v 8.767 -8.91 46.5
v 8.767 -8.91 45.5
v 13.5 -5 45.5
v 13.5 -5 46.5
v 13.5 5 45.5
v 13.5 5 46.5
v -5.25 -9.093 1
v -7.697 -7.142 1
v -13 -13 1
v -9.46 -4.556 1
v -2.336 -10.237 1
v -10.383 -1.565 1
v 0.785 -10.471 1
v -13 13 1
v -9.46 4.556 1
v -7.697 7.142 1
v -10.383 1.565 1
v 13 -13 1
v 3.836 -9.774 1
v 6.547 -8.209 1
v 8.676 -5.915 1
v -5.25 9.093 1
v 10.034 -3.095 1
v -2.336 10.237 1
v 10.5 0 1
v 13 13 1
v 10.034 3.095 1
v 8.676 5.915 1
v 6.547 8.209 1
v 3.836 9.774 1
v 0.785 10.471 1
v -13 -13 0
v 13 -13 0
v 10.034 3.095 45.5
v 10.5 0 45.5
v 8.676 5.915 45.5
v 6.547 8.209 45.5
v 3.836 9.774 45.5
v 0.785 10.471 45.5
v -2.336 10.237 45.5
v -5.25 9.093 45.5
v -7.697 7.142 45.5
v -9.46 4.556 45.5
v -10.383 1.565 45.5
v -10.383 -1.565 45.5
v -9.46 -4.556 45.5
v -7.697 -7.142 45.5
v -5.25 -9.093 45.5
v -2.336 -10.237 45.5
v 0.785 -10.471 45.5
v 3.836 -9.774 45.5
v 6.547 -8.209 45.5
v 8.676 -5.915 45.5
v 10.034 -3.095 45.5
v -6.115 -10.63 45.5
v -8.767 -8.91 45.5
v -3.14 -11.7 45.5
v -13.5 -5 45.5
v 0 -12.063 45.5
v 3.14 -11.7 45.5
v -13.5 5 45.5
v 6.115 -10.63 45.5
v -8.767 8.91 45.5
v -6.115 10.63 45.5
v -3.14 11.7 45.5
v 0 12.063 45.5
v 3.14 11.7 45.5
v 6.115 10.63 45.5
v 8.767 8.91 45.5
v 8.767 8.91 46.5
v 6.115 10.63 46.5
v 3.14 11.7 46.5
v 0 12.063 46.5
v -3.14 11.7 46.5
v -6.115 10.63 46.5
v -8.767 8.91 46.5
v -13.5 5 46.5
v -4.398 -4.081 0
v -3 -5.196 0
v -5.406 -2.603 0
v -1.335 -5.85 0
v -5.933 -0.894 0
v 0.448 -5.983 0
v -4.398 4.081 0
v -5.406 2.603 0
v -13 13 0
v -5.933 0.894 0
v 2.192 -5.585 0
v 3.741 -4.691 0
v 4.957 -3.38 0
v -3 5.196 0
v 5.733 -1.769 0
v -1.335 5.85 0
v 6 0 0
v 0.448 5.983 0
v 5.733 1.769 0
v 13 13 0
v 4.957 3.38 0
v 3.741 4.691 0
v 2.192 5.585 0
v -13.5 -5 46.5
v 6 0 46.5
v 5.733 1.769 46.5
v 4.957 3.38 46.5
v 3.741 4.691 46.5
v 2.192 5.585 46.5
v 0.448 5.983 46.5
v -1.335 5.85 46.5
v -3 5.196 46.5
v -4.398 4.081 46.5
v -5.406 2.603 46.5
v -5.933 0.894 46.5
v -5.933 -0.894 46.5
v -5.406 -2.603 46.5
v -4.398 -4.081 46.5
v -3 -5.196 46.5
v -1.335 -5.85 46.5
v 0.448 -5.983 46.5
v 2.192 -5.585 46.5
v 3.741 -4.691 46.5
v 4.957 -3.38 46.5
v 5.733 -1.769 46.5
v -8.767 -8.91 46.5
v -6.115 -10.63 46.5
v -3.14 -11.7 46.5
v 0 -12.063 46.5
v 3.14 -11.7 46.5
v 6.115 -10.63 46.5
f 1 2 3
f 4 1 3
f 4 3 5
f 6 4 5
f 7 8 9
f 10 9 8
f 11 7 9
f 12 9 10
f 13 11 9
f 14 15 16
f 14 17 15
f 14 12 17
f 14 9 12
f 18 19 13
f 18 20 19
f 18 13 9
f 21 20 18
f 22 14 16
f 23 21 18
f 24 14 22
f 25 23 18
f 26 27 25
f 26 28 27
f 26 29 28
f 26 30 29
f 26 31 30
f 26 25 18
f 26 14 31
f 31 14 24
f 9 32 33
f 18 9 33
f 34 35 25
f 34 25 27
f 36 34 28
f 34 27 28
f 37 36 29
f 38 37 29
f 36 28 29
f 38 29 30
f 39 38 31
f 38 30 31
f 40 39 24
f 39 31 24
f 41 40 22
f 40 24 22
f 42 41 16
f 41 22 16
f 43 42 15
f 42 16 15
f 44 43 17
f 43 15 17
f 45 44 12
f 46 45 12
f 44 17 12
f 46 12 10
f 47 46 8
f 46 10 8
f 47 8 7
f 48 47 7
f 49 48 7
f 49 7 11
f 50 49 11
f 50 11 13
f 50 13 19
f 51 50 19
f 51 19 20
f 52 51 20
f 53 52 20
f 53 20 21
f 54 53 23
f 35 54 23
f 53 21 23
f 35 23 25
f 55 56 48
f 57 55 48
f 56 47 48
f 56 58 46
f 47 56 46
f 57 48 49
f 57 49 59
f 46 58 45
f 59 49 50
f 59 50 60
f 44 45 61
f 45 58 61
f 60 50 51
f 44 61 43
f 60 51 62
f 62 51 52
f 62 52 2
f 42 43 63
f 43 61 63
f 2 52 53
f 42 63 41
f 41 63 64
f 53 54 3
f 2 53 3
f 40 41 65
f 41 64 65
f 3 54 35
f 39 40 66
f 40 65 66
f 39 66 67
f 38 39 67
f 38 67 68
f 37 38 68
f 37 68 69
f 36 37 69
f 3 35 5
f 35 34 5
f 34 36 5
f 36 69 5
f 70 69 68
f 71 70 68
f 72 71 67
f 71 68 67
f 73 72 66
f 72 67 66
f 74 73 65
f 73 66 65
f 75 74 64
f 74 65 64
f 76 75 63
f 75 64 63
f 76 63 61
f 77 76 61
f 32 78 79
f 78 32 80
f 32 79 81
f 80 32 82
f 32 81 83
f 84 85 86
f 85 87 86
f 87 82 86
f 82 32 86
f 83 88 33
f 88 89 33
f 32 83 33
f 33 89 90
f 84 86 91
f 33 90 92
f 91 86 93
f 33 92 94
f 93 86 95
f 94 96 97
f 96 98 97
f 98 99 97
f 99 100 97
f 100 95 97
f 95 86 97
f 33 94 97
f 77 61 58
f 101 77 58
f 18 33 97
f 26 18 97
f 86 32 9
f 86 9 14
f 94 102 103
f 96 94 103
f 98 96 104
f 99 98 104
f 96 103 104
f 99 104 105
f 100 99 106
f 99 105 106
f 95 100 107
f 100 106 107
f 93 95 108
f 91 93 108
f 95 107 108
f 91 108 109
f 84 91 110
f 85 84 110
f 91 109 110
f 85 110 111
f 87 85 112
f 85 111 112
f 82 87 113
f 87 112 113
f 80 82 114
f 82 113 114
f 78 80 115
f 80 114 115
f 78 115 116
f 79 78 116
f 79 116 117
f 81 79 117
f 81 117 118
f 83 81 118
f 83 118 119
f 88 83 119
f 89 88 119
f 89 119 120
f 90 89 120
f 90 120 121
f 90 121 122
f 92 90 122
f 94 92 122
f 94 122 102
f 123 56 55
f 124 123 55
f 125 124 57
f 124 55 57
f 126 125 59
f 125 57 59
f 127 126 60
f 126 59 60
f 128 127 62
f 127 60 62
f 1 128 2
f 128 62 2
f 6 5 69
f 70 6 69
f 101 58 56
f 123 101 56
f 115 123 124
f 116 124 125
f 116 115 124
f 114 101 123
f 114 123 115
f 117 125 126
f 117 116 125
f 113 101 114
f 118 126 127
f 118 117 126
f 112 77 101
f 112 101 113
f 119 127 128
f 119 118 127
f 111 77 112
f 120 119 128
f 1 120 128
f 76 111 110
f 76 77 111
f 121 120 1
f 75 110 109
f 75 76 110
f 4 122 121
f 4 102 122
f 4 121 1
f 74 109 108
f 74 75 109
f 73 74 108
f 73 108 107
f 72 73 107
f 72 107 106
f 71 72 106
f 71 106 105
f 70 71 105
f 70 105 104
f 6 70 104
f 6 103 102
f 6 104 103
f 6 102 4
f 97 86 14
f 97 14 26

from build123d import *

# Parameters (mm, degrees)
CROQUIS1_W              = 26
CROQUIS1_H              = 26
SALIENTE_EXTRUIR1_DEPTH = 1
CROQUIS2_R              = 10.5
SALIENTE_EXTRUIR2_DEPTH = 44.5
SALIENTE_EXTRUIR3_DEPTH = 1
CROQUIS4_R              = 6
CORTAR_EXTRUIR1_DEPTH   = 51.13481824


with BuildPart() as part:
    # Croquis1 → Saliente-Extruir1 (new body)
    with BuildSketch(Plane.XY):
        Rectangle(CROQUIS1_W, CROQUIS1_H)
    extrude(amount=SALIENTE_EXTRUIR1_DEPTH)

    # Croquis2 → Saliente-Extruir2 (add)
    with BuildSketch(Plane.XY.offset(1)):
        Circle(CROQUIS2_R)
    extrude(amount=SALIENTE_EXTRUIR2_DEPTH)

    # Croquis3 → Saliente-Extruir3 (add)
    with BuildSketch(Plane.XY.offset(45.5)):
        with BuildLine():
            ThreePointArc((10.5, 0), (0, -10.5), (-10.5, 0))
            Line((-10.5, 0), (-13.5, 0))
            Line((-13.5, 0), (-13.5, -5))
            Line((-13.5, -5), (-8.766919396, -8.910169713))
            ThreePointArc((-8.766919396, -8.910169713), (0, -12.063114964), (8.766919396, -8.910169713))
            Line((8.766919396, -8.910169713), (13.5, -5))
            Line((13.5, -5), (13.5, 0))
            Line((13.5, 0), (10.5, 0))
        make_face()
        with BuildLine():
            Line((-13.5, 0), (-10.5, 0))
            ThreePointArc((-10.5, 0), (0, 10.5), (10.5, 0))
            Line((10.5, 0), (13.5, 0))
            Line((13.5, 0), (13.5, 5))
            Line((13.5, 5), (8.766919396, 8.910169713))
            ThreePointArc((8.766919396, 8.910169713), (0, 12.063114964), (-8.766919396, 8.910169713))
            Line((-8.766919396, 8.910169713), (-13.5, 5))
            Line((-13.5, 5), (-13.5, 0))
        make_face()
        with BuildLine():
            Line((10.5, 0), (0, 0))
            Line((0, 0), (-10.5, 0))
            ThreePointArc((-10.5, 0), (0, -10.5), (10.5, 0))
        make_face()
        with BuildLine():
            Line((-10.5, 0), (0, 0))
            Line((0, 0), (10.5, 0))
            ThreePointArc((10.5, 0), (0, 10.5), (-10.5, 0))
        make_face()
    extrude(amount=SALIENTE_EXTRUIR3_DEPTH)

    # Croquis4 → Cortar-Extruir1 (cut, through all)
    with BuildSketch(Plane.XY.offset(46.5)):
        Circle(CROQUIS4_R)
    extrude(amount=-CORTAR_EXTRUIR1_DEPTH, mode=Mode.SUBTRACT)


solid = part.part
